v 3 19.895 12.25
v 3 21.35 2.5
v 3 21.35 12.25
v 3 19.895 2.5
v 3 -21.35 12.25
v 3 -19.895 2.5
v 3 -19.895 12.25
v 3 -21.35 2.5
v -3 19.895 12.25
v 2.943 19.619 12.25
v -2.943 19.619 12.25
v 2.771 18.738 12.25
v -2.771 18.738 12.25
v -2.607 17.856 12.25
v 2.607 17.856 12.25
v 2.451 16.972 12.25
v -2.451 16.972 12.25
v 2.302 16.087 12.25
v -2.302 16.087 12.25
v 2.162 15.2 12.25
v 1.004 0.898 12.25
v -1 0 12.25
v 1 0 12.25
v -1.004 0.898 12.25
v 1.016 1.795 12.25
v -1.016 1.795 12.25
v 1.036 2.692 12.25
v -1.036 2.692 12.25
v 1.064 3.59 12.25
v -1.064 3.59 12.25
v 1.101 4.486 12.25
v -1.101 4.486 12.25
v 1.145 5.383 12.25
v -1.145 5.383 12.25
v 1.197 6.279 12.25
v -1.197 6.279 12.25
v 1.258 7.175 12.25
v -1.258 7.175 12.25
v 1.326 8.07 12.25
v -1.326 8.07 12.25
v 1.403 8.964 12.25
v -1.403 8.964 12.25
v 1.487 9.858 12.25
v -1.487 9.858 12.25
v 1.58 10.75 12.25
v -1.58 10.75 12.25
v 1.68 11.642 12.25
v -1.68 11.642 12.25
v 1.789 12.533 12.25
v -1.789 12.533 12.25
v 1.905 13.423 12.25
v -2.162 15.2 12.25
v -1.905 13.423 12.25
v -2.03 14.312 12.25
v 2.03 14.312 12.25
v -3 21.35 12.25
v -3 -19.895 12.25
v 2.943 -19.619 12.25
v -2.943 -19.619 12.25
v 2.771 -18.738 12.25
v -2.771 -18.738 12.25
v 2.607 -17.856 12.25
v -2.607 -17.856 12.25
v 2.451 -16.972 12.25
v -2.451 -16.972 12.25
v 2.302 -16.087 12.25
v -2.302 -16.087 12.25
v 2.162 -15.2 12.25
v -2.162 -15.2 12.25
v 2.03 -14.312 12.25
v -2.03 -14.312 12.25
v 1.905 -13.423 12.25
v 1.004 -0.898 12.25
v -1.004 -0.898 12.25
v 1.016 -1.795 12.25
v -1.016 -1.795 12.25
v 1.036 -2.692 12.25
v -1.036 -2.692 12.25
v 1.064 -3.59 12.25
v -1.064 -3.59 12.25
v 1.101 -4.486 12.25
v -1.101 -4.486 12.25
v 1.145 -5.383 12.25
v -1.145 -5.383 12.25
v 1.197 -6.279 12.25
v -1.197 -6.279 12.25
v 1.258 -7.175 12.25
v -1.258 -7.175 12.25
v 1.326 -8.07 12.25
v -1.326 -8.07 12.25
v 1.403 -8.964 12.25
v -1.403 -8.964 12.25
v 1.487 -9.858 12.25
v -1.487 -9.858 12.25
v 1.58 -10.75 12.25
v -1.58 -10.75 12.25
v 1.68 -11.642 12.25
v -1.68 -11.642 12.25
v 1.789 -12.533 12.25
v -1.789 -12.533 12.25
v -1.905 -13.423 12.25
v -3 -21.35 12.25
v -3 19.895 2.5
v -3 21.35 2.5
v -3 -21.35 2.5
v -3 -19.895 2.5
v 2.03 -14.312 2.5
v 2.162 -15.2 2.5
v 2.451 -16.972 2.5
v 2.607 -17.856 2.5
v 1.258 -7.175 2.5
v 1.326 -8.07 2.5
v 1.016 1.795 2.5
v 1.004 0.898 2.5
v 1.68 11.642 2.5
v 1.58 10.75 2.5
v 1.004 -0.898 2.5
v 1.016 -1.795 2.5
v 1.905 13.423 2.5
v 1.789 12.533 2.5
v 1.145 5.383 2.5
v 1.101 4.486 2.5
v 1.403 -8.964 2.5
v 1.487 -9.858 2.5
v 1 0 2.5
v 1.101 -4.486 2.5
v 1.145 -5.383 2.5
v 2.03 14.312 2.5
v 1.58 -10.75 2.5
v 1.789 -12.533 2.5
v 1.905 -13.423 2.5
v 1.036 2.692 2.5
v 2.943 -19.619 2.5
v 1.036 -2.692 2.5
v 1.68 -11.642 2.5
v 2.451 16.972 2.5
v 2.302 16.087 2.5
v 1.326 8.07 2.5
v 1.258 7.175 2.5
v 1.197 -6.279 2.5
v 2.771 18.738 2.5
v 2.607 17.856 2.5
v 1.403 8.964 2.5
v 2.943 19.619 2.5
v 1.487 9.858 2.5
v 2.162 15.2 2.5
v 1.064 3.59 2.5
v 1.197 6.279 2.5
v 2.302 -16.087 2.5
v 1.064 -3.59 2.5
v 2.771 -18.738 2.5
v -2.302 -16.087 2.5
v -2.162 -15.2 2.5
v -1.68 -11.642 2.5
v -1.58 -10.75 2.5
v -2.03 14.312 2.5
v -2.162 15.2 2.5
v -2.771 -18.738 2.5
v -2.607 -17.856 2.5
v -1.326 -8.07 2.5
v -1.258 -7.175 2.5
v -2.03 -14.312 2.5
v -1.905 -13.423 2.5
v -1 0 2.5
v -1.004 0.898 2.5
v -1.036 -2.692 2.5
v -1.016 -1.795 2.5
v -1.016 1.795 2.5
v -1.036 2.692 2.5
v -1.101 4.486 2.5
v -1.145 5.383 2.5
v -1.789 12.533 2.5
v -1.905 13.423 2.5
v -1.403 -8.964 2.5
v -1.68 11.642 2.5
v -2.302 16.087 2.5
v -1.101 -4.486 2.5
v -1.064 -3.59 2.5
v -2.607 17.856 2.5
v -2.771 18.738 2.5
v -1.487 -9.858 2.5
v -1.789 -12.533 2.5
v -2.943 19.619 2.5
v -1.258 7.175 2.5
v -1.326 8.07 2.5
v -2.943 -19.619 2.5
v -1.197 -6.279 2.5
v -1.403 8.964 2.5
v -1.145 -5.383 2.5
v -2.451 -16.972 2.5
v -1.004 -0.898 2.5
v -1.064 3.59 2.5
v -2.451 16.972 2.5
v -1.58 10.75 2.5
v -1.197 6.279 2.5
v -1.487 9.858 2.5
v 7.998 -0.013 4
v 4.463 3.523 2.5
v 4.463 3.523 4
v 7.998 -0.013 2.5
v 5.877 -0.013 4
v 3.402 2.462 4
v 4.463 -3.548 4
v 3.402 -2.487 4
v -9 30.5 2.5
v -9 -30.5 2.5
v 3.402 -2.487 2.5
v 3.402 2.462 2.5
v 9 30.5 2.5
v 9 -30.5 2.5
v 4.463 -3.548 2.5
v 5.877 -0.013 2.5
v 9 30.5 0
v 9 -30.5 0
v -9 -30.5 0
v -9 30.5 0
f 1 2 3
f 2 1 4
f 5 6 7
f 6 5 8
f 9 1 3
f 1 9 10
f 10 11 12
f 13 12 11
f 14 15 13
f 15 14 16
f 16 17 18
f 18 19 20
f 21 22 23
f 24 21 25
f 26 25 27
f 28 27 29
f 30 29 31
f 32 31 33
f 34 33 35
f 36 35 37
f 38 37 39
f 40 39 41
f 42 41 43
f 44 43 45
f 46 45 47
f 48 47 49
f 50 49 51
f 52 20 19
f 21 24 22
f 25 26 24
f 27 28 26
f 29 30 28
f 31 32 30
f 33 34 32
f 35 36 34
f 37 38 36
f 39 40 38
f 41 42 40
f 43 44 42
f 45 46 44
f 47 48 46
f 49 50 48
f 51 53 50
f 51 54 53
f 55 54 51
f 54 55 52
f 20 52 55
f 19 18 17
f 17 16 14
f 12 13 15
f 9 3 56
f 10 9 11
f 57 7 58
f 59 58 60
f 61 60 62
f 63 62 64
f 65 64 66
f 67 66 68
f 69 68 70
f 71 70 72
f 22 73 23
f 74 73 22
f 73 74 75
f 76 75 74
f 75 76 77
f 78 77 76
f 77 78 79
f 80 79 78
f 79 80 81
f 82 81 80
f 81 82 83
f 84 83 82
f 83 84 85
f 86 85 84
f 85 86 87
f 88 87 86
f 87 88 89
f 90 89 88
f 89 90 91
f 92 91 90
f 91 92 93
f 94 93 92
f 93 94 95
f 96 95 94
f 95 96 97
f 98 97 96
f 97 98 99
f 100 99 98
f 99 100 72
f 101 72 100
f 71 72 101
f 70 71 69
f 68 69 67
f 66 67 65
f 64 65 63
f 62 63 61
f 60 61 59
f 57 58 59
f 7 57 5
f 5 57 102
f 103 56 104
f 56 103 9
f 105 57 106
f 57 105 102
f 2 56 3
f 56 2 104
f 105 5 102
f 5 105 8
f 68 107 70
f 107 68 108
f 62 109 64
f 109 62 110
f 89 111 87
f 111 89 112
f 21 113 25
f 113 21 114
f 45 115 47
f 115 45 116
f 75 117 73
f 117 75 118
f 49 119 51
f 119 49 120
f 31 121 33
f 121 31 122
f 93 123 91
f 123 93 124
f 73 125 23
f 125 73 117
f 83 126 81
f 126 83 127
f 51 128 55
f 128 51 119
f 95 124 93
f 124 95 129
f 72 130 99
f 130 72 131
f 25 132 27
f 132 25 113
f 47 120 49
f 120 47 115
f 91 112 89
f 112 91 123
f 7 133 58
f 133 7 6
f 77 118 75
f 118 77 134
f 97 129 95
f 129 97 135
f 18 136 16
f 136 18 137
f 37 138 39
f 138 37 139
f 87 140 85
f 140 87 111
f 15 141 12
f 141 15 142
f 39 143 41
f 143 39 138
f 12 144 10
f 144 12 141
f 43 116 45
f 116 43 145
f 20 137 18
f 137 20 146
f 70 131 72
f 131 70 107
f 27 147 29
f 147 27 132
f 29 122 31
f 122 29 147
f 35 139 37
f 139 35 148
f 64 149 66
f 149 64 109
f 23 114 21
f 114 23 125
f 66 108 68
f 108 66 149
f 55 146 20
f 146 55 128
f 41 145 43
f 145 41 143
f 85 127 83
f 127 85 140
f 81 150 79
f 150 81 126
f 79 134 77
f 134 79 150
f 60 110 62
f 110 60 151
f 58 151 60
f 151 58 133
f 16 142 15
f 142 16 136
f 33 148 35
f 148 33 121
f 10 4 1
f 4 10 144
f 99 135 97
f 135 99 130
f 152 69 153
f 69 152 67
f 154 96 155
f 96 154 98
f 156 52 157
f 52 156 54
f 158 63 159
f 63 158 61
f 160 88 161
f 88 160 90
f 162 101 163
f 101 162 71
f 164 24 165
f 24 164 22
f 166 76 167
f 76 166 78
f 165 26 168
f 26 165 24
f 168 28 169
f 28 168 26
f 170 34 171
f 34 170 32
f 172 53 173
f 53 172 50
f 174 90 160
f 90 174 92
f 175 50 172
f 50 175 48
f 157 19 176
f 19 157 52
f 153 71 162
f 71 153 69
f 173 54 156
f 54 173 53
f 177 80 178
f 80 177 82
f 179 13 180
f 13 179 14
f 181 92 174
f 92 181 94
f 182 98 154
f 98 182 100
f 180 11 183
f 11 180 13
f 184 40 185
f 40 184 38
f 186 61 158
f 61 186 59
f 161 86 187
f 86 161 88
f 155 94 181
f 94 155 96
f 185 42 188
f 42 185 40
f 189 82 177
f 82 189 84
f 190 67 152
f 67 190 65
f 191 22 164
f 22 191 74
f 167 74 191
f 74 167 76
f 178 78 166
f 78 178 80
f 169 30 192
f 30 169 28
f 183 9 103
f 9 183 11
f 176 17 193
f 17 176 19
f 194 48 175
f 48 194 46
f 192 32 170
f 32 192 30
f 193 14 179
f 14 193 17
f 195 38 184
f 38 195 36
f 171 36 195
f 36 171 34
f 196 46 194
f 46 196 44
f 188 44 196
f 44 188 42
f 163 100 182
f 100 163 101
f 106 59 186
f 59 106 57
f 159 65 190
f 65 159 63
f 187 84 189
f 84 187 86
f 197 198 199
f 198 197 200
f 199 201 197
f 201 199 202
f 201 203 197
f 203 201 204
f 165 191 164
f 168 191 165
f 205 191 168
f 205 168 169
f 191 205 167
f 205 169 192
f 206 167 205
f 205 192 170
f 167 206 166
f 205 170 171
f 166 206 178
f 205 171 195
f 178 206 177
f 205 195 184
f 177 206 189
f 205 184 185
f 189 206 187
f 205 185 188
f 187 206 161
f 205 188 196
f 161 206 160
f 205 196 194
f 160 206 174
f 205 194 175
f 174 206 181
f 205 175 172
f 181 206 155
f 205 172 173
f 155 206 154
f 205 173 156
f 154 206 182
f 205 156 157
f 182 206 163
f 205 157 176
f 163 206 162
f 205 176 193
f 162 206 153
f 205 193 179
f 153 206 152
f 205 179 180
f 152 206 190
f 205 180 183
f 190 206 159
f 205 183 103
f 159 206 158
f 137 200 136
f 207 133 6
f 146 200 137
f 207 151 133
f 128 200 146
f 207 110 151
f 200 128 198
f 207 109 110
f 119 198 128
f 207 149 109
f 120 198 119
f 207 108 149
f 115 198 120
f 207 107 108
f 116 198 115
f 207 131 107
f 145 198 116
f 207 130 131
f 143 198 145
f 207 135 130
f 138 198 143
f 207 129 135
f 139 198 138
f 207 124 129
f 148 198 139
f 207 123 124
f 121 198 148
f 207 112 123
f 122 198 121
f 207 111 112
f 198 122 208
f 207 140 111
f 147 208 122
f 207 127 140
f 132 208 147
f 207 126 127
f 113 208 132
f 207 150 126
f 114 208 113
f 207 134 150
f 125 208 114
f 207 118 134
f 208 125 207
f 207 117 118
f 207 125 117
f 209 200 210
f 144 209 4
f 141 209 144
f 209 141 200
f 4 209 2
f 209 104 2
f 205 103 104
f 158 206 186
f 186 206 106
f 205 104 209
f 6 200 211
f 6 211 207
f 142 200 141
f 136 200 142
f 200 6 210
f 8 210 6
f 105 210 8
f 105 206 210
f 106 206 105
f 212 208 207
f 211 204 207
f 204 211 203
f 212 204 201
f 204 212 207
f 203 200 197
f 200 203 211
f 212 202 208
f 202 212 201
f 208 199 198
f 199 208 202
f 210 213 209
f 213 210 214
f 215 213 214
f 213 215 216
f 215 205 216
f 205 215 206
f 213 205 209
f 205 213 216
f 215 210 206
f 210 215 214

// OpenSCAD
// [FL_INDEX: keywords="openscad, 3d_parametric, Stamp_Handle_01, csg_solid" | COT="Parametric OpenSCAD design from 3DCodeverse"]
// Title: Stamp Handle 01

WIDTH 	= 61; // [0:200]
LENGTH 	= 18; // [0:200]

translate([0,0,1.25]) cube(size = [LENGTH,WIDTH,2.5], center = true);

translate([0,0,7.25]) {
	difference() {
		color("green") cube(size = [6,WIDTH-WIDTH*0.3,10], center = true);
		
		translate([101,0,0]) cylinder(h = 10.1, r = 100, $fn=700, center = true);
		translate([-101,0,0]) cylinder(h = 10.1, r = 100, $fn=700, center = true);
	}
}

translate([5.7,-1.25,3.25]) rotate([0,0,45]){
	color("red") cube([5, 1.5, 1.5], center = true);
	translate ([1.75,1.75,0]) color("red") cube([1.5, 5, 1.5], center = true);
}
